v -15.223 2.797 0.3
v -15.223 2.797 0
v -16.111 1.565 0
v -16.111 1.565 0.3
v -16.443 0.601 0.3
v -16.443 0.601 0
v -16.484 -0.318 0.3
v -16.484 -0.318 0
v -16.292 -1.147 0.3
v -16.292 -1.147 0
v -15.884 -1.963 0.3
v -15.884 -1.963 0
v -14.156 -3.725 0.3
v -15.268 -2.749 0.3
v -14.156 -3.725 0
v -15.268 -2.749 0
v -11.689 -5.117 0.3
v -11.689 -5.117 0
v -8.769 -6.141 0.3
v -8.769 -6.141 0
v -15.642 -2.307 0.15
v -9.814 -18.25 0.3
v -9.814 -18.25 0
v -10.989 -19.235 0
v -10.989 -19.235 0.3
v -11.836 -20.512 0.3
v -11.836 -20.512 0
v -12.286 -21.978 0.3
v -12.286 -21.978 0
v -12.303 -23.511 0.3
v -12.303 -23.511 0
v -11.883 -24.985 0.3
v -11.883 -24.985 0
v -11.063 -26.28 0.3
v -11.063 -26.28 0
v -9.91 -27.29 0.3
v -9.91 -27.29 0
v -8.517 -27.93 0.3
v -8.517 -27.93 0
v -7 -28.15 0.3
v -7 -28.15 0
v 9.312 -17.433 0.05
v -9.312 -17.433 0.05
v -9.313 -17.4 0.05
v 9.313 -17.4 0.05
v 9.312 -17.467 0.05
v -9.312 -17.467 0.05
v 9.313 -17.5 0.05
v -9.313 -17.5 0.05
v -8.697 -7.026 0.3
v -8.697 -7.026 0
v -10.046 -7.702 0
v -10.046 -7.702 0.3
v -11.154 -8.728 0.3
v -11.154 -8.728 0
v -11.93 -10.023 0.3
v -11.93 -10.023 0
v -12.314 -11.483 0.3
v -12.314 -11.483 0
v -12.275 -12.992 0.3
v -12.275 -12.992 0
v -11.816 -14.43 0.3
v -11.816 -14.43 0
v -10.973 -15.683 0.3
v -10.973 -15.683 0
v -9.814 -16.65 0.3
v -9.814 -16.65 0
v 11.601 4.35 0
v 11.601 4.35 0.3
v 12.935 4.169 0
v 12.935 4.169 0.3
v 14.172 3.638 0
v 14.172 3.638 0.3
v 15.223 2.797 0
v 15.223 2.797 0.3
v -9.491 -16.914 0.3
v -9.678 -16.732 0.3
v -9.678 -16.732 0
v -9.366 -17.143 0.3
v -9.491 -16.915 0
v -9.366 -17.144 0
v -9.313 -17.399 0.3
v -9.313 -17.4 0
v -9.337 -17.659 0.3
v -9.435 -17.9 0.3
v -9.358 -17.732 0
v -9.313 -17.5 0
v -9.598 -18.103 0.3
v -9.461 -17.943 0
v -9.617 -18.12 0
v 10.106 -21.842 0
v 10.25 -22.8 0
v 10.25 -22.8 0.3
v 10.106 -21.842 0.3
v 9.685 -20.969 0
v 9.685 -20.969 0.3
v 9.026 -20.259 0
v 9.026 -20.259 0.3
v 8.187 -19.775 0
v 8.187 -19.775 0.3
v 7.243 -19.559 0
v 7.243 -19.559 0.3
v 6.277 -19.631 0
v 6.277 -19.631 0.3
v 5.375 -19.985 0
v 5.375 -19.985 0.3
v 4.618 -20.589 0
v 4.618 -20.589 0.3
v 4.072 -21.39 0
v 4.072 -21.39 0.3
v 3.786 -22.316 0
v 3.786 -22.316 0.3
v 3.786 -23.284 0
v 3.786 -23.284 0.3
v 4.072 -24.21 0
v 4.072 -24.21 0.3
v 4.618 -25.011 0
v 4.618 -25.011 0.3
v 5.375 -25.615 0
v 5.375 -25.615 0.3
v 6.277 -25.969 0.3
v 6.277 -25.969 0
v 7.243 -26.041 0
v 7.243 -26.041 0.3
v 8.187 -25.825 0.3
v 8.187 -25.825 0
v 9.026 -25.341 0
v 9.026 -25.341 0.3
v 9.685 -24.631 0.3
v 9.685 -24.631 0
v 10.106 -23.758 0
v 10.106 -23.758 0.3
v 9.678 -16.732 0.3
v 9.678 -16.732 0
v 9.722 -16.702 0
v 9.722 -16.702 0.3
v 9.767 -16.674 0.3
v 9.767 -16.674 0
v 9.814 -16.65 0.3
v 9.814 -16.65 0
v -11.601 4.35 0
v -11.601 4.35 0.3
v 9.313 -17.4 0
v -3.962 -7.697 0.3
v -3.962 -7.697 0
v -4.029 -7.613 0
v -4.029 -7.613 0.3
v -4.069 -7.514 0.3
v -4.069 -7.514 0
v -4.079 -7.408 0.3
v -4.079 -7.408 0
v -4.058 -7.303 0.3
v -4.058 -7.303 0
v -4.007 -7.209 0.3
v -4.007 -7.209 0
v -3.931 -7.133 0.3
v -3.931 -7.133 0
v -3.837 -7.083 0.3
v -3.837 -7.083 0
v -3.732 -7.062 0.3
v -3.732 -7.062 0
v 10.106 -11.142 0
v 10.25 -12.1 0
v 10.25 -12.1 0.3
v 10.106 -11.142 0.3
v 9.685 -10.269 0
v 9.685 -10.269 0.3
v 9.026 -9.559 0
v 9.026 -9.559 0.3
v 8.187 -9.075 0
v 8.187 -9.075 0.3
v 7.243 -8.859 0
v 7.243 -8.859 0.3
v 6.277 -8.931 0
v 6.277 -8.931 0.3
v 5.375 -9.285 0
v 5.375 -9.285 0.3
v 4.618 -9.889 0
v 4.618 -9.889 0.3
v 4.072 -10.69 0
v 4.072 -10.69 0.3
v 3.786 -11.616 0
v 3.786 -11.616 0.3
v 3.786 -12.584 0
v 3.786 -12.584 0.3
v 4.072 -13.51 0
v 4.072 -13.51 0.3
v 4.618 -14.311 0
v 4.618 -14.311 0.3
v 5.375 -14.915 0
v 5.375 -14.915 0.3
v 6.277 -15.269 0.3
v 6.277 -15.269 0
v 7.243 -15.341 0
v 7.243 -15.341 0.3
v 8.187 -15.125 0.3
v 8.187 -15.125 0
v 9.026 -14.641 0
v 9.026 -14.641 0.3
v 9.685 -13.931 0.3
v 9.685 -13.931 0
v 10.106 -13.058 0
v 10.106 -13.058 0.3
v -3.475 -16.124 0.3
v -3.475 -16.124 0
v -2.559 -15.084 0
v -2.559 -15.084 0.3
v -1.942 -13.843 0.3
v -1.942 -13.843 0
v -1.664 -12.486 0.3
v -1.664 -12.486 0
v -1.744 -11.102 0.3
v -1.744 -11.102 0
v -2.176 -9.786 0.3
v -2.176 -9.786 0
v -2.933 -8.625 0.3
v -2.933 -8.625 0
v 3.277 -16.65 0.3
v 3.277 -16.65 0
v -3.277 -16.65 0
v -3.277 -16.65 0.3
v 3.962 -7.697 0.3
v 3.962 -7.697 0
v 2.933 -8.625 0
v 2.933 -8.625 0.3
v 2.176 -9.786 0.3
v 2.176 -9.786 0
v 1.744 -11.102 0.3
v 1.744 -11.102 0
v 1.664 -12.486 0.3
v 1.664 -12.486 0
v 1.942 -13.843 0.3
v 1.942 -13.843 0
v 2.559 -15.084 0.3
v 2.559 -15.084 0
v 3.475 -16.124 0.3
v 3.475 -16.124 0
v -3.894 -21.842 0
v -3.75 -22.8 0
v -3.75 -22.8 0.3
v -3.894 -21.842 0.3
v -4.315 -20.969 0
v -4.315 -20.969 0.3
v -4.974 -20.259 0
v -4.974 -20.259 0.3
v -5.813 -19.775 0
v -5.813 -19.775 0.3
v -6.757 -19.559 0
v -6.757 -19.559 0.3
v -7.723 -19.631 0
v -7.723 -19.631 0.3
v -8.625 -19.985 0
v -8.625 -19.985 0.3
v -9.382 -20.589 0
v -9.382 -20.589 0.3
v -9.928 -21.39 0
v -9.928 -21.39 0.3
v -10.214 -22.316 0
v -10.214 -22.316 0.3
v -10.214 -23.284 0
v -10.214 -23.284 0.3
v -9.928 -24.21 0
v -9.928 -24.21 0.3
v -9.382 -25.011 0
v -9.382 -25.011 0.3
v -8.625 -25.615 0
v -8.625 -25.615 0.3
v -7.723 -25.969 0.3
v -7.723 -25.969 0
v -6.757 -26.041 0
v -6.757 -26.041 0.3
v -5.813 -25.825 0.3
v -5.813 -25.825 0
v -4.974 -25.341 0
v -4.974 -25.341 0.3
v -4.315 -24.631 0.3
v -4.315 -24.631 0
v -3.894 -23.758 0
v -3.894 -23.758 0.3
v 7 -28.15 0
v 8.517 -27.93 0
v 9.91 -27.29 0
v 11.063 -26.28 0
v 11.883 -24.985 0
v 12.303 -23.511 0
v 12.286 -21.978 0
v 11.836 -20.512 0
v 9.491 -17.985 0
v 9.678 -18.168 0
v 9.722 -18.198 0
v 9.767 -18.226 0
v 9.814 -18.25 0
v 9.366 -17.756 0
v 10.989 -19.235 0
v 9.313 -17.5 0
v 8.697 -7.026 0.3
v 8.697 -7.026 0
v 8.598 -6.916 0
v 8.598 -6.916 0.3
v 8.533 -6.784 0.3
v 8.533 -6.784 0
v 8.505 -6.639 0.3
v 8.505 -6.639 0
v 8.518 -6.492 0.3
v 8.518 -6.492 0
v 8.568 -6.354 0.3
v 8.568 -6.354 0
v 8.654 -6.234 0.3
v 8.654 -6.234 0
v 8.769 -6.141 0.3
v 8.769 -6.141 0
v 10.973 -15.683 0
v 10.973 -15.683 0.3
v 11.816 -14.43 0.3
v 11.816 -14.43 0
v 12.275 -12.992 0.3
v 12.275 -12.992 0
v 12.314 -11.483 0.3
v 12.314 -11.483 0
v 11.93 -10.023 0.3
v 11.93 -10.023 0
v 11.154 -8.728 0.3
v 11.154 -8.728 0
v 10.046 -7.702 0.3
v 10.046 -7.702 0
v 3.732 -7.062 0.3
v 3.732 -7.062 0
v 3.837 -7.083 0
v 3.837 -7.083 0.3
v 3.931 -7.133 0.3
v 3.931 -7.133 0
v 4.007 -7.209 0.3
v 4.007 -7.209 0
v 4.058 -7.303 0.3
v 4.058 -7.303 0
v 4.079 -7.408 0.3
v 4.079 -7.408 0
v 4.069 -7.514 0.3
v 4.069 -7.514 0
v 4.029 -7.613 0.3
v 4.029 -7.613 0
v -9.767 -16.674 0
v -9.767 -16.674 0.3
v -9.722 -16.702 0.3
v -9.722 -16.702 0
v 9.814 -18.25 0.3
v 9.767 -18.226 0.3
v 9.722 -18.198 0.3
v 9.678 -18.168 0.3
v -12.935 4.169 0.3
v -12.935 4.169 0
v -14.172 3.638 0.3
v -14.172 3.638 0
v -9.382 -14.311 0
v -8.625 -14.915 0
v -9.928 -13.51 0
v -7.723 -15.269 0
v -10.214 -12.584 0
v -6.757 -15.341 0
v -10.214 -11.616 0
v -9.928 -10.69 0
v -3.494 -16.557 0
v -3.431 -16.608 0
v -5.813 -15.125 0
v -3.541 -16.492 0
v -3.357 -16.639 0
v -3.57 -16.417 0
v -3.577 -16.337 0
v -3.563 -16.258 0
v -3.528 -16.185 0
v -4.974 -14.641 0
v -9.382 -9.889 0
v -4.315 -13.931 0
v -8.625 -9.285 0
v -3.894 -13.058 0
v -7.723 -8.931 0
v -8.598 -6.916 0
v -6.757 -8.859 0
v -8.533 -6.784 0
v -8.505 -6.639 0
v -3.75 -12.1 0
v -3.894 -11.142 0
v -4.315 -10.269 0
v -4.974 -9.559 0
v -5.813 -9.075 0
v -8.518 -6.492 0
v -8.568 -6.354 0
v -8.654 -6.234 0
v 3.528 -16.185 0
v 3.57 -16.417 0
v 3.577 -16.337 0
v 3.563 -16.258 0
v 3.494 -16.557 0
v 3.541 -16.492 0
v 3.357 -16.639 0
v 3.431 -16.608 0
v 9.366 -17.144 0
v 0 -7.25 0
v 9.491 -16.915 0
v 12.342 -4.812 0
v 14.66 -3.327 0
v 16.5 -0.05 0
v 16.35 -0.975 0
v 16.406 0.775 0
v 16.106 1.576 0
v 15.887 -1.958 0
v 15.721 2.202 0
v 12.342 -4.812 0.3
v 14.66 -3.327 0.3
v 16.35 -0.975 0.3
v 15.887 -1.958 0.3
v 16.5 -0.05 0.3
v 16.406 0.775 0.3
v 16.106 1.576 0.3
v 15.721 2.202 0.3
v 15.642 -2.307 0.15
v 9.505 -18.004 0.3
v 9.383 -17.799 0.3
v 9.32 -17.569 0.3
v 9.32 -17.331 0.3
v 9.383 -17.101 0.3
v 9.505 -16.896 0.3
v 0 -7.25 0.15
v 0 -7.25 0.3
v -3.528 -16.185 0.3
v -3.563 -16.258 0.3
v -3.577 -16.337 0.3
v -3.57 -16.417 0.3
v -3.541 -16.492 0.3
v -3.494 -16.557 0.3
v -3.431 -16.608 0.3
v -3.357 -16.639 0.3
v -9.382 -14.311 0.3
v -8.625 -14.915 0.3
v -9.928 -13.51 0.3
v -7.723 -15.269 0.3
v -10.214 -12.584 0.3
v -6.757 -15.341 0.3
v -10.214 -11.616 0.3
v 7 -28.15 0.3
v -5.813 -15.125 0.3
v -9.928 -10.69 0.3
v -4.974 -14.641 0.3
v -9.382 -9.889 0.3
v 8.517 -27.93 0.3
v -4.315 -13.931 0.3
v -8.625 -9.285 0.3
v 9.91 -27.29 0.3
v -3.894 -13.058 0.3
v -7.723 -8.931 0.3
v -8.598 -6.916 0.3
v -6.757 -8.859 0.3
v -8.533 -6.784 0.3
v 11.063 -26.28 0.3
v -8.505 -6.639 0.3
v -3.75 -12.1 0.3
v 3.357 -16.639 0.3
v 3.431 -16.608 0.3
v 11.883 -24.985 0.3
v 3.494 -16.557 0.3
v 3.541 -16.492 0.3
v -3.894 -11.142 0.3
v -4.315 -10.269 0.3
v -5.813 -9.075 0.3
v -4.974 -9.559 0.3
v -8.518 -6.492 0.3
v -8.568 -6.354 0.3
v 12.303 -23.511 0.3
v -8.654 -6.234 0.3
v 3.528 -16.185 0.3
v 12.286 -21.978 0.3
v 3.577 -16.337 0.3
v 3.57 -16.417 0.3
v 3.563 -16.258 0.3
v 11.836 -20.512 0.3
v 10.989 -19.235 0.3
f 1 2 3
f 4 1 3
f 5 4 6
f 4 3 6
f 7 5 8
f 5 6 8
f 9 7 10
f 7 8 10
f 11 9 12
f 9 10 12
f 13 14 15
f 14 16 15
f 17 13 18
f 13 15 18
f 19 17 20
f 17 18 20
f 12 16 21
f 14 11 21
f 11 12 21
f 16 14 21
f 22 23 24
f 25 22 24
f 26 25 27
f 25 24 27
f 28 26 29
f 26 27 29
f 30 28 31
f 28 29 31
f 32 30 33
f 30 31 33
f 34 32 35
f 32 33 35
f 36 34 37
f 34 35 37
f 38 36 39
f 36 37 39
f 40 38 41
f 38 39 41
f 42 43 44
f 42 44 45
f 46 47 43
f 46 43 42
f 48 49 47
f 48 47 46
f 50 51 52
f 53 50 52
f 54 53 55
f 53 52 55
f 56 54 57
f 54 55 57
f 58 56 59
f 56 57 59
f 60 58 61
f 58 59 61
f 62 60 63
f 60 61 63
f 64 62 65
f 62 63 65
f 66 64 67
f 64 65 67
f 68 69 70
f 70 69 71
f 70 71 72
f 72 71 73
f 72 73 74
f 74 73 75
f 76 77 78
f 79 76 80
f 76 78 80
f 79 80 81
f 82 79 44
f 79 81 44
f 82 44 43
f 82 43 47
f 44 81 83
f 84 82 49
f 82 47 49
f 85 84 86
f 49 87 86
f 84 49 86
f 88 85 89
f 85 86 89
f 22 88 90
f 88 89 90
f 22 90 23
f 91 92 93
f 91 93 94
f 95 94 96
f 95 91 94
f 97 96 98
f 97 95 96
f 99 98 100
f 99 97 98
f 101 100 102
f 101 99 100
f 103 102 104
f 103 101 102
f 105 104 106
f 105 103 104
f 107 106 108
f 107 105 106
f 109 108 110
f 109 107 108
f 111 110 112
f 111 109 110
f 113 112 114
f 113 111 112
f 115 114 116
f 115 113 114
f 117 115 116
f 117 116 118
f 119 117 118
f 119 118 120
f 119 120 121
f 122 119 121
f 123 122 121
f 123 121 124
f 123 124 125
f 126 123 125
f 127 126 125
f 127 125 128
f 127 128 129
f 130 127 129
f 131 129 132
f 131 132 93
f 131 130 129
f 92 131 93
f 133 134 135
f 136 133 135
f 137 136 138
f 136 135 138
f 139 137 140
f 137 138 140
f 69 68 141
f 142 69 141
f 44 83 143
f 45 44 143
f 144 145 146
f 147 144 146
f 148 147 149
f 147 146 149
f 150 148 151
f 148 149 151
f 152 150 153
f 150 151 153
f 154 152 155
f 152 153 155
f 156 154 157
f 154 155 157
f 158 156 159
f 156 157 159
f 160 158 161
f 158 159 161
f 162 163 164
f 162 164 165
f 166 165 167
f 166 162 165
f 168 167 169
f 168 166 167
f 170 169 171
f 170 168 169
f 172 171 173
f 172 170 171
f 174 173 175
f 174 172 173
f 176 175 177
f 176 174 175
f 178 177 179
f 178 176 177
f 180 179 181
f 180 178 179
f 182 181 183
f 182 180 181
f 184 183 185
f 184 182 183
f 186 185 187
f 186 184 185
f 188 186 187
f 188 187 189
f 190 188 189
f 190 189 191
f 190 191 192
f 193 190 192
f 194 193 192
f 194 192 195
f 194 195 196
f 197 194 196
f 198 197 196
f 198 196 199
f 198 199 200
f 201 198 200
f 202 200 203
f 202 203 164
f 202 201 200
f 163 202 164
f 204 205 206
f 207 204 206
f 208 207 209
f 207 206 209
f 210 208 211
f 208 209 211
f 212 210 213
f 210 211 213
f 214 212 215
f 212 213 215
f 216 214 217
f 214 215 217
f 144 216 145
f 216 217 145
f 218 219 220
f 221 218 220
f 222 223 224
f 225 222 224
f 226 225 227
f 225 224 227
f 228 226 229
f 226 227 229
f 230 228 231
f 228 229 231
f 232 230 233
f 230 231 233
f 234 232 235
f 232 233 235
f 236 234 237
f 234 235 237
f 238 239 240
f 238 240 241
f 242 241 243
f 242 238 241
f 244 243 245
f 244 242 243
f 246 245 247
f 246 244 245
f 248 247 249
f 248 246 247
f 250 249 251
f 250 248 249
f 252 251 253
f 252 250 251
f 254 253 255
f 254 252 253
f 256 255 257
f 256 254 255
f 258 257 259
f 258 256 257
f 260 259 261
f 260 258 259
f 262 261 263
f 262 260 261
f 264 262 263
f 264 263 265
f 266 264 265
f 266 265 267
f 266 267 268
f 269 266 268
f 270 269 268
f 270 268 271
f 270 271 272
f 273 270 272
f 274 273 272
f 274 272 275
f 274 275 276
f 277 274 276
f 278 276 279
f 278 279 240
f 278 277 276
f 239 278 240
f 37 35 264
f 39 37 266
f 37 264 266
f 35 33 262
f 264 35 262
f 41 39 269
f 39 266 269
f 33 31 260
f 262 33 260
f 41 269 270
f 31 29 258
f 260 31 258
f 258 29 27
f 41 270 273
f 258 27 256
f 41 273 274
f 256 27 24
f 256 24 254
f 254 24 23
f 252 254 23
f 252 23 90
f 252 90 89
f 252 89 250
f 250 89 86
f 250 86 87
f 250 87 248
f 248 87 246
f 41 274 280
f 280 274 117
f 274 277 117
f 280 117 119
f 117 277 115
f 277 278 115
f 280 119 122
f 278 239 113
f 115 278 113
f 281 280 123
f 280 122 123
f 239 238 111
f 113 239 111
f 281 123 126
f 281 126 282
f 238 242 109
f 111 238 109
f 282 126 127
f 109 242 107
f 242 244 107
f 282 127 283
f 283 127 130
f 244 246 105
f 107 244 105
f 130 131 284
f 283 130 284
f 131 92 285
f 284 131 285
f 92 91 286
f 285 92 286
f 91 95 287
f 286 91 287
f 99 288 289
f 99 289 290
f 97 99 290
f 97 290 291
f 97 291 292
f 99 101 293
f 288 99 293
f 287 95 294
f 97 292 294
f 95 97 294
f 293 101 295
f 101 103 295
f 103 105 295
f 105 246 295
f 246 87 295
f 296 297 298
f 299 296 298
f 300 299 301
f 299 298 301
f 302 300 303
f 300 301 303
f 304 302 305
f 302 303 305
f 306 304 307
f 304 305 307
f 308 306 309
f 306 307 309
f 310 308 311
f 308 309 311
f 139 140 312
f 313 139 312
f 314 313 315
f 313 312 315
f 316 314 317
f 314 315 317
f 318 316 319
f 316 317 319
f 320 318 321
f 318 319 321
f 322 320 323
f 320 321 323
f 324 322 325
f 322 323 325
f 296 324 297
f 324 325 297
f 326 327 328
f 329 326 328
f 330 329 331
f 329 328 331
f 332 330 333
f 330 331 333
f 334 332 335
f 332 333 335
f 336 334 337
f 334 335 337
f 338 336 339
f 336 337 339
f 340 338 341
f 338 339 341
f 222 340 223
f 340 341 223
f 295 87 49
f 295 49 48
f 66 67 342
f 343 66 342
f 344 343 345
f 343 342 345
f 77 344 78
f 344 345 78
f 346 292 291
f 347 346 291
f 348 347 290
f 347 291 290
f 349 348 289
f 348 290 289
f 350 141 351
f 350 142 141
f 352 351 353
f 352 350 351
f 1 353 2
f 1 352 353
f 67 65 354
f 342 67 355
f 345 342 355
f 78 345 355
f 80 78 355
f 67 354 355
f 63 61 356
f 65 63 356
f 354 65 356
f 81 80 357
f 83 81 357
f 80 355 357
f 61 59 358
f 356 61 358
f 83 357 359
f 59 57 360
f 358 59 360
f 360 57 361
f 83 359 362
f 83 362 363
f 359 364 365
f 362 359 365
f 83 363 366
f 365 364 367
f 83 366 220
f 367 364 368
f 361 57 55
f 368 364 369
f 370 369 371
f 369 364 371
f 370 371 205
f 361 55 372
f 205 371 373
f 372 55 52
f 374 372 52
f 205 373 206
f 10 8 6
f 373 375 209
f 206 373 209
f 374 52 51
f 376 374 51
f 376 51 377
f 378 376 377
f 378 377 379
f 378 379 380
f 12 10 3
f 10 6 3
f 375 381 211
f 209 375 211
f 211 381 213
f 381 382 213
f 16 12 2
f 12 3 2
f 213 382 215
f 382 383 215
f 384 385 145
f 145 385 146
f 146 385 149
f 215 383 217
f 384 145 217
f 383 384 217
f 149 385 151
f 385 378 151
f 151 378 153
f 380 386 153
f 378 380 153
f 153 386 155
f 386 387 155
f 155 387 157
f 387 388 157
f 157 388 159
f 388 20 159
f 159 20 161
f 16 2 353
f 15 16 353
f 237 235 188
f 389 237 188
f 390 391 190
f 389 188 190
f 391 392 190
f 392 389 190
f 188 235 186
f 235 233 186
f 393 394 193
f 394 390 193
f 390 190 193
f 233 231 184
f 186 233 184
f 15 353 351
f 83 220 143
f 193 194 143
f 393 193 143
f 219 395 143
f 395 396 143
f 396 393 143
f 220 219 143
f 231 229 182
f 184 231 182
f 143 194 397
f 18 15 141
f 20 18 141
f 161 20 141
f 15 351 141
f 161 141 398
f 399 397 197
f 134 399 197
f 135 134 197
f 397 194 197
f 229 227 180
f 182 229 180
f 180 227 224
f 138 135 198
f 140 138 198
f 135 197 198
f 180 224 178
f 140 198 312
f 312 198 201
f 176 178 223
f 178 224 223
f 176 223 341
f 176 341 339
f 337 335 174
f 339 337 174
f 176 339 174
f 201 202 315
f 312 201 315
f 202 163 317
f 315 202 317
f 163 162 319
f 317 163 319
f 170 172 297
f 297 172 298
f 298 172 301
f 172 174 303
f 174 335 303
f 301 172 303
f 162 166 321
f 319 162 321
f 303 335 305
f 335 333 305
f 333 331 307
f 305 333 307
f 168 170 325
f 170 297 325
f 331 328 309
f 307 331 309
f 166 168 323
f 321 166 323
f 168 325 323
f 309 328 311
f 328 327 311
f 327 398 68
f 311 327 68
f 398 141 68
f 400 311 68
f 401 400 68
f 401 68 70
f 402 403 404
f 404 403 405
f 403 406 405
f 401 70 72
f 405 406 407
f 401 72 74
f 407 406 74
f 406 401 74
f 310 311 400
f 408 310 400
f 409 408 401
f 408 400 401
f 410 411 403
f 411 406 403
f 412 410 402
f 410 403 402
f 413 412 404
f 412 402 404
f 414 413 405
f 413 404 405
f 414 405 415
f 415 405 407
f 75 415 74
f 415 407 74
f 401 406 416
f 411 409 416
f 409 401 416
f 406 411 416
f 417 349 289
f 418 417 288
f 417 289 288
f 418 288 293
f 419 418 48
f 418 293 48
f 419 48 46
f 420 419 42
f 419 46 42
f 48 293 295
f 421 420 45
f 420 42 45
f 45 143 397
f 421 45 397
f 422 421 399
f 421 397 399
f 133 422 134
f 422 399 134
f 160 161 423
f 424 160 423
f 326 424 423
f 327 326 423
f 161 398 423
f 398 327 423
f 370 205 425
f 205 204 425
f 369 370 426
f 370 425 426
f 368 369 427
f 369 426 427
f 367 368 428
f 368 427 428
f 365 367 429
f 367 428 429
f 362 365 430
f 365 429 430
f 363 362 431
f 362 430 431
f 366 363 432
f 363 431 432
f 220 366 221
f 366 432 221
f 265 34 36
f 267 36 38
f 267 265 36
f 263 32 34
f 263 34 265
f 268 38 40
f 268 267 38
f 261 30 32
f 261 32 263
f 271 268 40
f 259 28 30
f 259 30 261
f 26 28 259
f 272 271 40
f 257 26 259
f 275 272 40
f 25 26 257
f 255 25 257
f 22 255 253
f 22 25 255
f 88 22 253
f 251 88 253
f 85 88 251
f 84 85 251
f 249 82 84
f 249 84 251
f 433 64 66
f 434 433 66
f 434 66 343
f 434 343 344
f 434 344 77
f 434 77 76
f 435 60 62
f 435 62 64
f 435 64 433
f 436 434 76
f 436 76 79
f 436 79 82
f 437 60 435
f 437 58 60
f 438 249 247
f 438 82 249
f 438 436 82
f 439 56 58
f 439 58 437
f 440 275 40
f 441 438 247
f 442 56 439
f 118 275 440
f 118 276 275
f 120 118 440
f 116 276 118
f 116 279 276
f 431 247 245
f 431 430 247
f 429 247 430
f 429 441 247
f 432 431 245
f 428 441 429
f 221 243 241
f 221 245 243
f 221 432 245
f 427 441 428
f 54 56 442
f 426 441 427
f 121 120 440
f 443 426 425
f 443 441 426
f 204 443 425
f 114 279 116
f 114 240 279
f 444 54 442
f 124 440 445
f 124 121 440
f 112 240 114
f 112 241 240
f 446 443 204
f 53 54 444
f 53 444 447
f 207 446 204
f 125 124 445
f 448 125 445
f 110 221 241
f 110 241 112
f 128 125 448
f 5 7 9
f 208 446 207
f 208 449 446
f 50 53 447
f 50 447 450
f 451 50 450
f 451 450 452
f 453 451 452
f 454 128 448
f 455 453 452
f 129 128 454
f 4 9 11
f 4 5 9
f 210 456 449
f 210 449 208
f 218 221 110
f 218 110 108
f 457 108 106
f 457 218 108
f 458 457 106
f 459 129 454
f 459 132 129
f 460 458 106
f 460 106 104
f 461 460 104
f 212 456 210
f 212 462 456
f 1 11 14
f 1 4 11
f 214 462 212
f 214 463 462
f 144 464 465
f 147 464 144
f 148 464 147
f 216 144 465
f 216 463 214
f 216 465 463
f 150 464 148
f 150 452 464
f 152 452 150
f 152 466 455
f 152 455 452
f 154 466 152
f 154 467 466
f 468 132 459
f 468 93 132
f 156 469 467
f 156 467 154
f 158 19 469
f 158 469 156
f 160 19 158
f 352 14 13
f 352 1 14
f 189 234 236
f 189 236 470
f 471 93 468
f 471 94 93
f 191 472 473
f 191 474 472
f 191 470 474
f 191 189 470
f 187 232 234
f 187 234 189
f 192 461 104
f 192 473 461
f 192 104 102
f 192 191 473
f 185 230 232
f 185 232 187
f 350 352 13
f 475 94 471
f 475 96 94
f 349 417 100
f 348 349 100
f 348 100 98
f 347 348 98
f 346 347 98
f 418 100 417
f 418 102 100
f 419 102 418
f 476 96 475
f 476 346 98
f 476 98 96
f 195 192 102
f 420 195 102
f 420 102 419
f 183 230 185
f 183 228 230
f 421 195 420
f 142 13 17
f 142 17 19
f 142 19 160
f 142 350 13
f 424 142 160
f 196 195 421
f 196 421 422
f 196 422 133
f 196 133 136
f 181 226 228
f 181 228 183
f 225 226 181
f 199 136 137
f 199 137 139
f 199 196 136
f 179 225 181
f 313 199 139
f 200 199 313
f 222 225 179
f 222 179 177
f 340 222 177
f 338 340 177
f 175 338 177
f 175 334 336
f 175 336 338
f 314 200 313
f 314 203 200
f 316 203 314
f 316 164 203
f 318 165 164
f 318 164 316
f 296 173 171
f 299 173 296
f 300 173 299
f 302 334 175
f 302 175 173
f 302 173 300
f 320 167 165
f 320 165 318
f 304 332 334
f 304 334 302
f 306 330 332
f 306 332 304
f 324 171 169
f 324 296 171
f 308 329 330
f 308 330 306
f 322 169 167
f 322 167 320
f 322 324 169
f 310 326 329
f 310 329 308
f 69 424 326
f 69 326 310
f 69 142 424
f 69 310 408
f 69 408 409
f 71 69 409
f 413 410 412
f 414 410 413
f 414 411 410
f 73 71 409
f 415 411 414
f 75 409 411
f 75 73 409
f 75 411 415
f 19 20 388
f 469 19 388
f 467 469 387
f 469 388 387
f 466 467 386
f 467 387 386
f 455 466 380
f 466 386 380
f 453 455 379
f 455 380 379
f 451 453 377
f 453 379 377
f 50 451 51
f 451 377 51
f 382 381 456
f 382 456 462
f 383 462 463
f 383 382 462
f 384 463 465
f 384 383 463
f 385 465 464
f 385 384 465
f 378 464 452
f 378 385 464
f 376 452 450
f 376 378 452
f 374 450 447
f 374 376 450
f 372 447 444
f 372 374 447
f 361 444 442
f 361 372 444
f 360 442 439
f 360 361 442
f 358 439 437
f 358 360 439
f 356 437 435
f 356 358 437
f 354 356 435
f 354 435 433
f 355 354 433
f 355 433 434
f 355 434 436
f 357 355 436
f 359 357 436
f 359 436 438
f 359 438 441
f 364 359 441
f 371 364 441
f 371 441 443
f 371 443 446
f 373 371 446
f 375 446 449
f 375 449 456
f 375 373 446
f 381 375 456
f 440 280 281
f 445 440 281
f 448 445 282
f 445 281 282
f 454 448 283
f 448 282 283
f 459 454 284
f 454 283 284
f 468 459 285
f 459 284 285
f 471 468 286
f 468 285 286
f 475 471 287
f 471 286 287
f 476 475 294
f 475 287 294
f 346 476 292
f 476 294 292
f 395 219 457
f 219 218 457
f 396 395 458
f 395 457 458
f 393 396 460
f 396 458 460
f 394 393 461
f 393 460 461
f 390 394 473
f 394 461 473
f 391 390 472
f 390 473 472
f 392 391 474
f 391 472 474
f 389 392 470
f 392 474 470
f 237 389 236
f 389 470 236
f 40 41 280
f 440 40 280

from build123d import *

# Parameters (mm, degrees)
F0_R     = 3.25
F1_DEPTH = 0.3
F2_R     = 5
F3_R     = 0.3
F4_W     = 22
F4_H     = 0.1
F5_DEPTH = 0.05


with BuildPart() as f1:
    # F0 (on Top) → F1 (new body)
    with BuildSketch(Plane.XY):
        with BuildLine():
            Line((13.2, 4.35), (-13.2, 4.35))
            add(Edge.make_bspline(
                [(-13.2, 4.35), (-23.9595582635, -1.9535795887), (-8.7692884448, -6.141299865)],
                knots=[2.4980915448, 2.4980915448, 2.4980915448, 4.1520515858, 4.1520515858, 4.1520515858], degree=2, weights=[1, 0.6771012168, 1]))
            ThreePointArc((-8.7692884448, -6.141299865), (-8.5065273892, -6.5651174574), (-8.6965923284, -7.0261381108))
            ThreePointArc((-8.6965923284, -7.0261381108), (-12.3142829071, -11.4828313169), (-9.8142494559, -16.65))
            ThreePointArc((-9.8142494559, -16.65), (-9.7441006003, -16.6877931911), (-9.6776213413, -16.7317214891))
            ThreePointArc((-9.6776213413, -16.7317214891), (-9.3154283119, -17.5296015758), (-9.8142494559, -18.25))
            ThreePointArc((-9.8142494559, -18.25), (-12.1461150395, -24.2628738838), (-7, -28.15))
            Line((-7, -28.15), (7, -28.15))
            ThreePointArc((7, -28.15), (12.1461150395, -24.2628738838), (9.8142494559, -18.25))
            ThreePointArc((9.8142494559, -18.25), (9.7441006003, -18.2122068089), (9.6776213413, -18.1682785109))
            ThreePointArc((9.6776213413, -18.1682785109), (9.3118539071, -17.45), (9.6776213413, -16.7317214891))
            ThreePointArc((9.6776213413, -16.7317214891), (9.7441006003, -16.6877931911), (9.8142494559, -16.65))
            ThreePointArc((9.8142494559, -16.65), (12.3142829071, -11.4828313169), (8.6965923284, -7.0261381108))
            ThreePointArc((8.6965923284, -7.0261381108), (8.5065273892, -6.5651174574), (8.7692884448, -6.141299865))
            add(Edge.make_bspline(
                [(8.7692884448, -6.141299865), (23.9595582635, -1.9535795887), (13.2, 4.35)],
                knots=[5.272726375, 5.272726375, 5.272726375, 6.926686416, 6.926686416, 6.926686416], degree=2, weights=[1, 0.6771012168, 1]))
        make_face()
        with Locations((-7, -22.8)):
            Circle(F0_R, mode=Mode.SUBTRACT)
        with Locations((-7, -12.1)):
            Circle(F0_R, mode=Mode.SUBTRACT)
        with Locations((7, -22.8)):
            Circle(F0_R, mode=Mode.SUBTRACT)
        with Locations((7, -12.1)):
            Circle(F0_R, mode=Mode.SUBTRACT)
        with BuildLine():
            ThreePointArc((-3.9615510182, -7.6965550094), (-4.0576261026, -7.3030225288), (-3.7319495204, -7.0621221367))
            add(Edge.make_bspline(
                [(-3.7319495204, -7.0621221367), (0, -7.4428760906), (3.7319495204, -7.0621221367)],
                knots=[4.4842359958, 4.4842359958, 4.4842359958, 4.9405419649, 4.9405419649, 4.9405419649], degree=2, weights=[1, 0.974085812, 1]))
            ThreePointArc((3.7319495204, -7.0621221367), (4.0576261026, -7.3030225288), (3.9615510182, -7.6965550094))
            ThreePointArc((3.9615510182, -7.6965550094), (1.6516765197, -12.233925164), (4.1857505441, -16.65))
            Line((4.1857505441, -16.65), (-4.1857505441, -16.65))
            ThreePointArc((-4.1857505441, -16.65), (-1.6516765197, -12.233925164), (-3.9615510182, -7.6965550094))
        make_face(mode=Mode.SUBTRACT)
    extrude(amount=F1_DEPTH)

    # F2
    f2_edges = [f1.edges().sort_by_distance(p)[0] for p in [
        (13.2, 4.35, 0.15),
        (-13.2, 4.35, 0.15),
    ]]
    fillet(f2_edges, radius=F2_R)

    # F3
    f3_edges = [f1.edges().sort_by_distance(p)[0] for p in [
        (-4.185751, -16.65, 0.15),
        (4.185751, -16.65, 0.15),
    ]]
    fillet(f3_edges, radius=F3_R)

    # F4 (on face) → F5 (cut)
    with BuildSketch(Plane(origin=(0, 0, 0), x_dir=(1, 0, 0), z_dir=(0, 0, -1))):
        with Locations((0, 17.45)):
            Rectangle(F4_W, F4_H)
    extrude(amount=-F5_DEPTH, mode=Mode.SUBTRACT)


solid = f1.part
